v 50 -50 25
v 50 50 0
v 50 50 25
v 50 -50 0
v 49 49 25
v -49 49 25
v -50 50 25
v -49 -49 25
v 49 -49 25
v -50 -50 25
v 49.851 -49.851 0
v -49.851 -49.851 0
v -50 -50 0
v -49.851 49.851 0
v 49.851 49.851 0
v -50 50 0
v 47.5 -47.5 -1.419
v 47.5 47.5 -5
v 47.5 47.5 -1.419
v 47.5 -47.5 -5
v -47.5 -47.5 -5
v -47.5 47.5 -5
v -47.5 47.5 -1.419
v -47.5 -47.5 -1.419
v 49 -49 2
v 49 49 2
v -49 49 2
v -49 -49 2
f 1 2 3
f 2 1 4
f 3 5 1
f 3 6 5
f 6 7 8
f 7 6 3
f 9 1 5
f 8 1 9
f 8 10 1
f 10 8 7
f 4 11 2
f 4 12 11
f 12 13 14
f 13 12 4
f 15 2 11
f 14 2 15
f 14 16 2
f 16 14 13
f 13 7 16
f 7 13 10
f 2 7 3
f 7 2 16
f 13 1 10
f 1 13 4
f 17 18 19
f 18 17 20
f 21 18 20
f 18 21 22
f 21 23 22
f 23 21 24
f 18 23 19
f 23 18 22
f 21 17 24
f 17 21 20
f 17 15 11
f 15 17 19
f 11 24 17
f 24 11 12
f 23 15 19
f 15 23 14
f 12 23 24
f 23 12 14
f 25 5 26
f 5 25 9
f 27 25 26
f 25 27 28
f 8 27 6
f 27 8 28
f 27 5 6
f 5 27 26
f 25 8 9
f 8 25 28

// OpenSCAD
H=25;               // Height of main box
H2=5;               // Height of bottom centering
SIDE=100;           // Side of box
D=2;                // Wall-thickness of box
D2=2.5;             // Setback of centering
HI=23;              // Inner Cut-Out

difference() {
    union() {
        translate([0,0,H/2]) cube([SIDE,SIDE,H], center=true );                                     // Main Box 100x100x40
        translate([0,0,-H2/2]) cube([SIDE-2*D2,SIDE-2*D2,H2],center=true);                          // Bottom
        translate([0,0,-2]) rotate([0,0,45]) cylinder(h=2,d1=1.35*(SIDE-D2),d2=1.41*SIDE,$fn=4);    // Chamfer
    }
    translate([0,0, 2*H-HI]) cube([SIDE-D,SIDE-D,2*H],center=true);                                  // Inner Cut-Out
    
//    translate([0,-100,0]) cube([300,200,300],center=true); // Tester
   
}
